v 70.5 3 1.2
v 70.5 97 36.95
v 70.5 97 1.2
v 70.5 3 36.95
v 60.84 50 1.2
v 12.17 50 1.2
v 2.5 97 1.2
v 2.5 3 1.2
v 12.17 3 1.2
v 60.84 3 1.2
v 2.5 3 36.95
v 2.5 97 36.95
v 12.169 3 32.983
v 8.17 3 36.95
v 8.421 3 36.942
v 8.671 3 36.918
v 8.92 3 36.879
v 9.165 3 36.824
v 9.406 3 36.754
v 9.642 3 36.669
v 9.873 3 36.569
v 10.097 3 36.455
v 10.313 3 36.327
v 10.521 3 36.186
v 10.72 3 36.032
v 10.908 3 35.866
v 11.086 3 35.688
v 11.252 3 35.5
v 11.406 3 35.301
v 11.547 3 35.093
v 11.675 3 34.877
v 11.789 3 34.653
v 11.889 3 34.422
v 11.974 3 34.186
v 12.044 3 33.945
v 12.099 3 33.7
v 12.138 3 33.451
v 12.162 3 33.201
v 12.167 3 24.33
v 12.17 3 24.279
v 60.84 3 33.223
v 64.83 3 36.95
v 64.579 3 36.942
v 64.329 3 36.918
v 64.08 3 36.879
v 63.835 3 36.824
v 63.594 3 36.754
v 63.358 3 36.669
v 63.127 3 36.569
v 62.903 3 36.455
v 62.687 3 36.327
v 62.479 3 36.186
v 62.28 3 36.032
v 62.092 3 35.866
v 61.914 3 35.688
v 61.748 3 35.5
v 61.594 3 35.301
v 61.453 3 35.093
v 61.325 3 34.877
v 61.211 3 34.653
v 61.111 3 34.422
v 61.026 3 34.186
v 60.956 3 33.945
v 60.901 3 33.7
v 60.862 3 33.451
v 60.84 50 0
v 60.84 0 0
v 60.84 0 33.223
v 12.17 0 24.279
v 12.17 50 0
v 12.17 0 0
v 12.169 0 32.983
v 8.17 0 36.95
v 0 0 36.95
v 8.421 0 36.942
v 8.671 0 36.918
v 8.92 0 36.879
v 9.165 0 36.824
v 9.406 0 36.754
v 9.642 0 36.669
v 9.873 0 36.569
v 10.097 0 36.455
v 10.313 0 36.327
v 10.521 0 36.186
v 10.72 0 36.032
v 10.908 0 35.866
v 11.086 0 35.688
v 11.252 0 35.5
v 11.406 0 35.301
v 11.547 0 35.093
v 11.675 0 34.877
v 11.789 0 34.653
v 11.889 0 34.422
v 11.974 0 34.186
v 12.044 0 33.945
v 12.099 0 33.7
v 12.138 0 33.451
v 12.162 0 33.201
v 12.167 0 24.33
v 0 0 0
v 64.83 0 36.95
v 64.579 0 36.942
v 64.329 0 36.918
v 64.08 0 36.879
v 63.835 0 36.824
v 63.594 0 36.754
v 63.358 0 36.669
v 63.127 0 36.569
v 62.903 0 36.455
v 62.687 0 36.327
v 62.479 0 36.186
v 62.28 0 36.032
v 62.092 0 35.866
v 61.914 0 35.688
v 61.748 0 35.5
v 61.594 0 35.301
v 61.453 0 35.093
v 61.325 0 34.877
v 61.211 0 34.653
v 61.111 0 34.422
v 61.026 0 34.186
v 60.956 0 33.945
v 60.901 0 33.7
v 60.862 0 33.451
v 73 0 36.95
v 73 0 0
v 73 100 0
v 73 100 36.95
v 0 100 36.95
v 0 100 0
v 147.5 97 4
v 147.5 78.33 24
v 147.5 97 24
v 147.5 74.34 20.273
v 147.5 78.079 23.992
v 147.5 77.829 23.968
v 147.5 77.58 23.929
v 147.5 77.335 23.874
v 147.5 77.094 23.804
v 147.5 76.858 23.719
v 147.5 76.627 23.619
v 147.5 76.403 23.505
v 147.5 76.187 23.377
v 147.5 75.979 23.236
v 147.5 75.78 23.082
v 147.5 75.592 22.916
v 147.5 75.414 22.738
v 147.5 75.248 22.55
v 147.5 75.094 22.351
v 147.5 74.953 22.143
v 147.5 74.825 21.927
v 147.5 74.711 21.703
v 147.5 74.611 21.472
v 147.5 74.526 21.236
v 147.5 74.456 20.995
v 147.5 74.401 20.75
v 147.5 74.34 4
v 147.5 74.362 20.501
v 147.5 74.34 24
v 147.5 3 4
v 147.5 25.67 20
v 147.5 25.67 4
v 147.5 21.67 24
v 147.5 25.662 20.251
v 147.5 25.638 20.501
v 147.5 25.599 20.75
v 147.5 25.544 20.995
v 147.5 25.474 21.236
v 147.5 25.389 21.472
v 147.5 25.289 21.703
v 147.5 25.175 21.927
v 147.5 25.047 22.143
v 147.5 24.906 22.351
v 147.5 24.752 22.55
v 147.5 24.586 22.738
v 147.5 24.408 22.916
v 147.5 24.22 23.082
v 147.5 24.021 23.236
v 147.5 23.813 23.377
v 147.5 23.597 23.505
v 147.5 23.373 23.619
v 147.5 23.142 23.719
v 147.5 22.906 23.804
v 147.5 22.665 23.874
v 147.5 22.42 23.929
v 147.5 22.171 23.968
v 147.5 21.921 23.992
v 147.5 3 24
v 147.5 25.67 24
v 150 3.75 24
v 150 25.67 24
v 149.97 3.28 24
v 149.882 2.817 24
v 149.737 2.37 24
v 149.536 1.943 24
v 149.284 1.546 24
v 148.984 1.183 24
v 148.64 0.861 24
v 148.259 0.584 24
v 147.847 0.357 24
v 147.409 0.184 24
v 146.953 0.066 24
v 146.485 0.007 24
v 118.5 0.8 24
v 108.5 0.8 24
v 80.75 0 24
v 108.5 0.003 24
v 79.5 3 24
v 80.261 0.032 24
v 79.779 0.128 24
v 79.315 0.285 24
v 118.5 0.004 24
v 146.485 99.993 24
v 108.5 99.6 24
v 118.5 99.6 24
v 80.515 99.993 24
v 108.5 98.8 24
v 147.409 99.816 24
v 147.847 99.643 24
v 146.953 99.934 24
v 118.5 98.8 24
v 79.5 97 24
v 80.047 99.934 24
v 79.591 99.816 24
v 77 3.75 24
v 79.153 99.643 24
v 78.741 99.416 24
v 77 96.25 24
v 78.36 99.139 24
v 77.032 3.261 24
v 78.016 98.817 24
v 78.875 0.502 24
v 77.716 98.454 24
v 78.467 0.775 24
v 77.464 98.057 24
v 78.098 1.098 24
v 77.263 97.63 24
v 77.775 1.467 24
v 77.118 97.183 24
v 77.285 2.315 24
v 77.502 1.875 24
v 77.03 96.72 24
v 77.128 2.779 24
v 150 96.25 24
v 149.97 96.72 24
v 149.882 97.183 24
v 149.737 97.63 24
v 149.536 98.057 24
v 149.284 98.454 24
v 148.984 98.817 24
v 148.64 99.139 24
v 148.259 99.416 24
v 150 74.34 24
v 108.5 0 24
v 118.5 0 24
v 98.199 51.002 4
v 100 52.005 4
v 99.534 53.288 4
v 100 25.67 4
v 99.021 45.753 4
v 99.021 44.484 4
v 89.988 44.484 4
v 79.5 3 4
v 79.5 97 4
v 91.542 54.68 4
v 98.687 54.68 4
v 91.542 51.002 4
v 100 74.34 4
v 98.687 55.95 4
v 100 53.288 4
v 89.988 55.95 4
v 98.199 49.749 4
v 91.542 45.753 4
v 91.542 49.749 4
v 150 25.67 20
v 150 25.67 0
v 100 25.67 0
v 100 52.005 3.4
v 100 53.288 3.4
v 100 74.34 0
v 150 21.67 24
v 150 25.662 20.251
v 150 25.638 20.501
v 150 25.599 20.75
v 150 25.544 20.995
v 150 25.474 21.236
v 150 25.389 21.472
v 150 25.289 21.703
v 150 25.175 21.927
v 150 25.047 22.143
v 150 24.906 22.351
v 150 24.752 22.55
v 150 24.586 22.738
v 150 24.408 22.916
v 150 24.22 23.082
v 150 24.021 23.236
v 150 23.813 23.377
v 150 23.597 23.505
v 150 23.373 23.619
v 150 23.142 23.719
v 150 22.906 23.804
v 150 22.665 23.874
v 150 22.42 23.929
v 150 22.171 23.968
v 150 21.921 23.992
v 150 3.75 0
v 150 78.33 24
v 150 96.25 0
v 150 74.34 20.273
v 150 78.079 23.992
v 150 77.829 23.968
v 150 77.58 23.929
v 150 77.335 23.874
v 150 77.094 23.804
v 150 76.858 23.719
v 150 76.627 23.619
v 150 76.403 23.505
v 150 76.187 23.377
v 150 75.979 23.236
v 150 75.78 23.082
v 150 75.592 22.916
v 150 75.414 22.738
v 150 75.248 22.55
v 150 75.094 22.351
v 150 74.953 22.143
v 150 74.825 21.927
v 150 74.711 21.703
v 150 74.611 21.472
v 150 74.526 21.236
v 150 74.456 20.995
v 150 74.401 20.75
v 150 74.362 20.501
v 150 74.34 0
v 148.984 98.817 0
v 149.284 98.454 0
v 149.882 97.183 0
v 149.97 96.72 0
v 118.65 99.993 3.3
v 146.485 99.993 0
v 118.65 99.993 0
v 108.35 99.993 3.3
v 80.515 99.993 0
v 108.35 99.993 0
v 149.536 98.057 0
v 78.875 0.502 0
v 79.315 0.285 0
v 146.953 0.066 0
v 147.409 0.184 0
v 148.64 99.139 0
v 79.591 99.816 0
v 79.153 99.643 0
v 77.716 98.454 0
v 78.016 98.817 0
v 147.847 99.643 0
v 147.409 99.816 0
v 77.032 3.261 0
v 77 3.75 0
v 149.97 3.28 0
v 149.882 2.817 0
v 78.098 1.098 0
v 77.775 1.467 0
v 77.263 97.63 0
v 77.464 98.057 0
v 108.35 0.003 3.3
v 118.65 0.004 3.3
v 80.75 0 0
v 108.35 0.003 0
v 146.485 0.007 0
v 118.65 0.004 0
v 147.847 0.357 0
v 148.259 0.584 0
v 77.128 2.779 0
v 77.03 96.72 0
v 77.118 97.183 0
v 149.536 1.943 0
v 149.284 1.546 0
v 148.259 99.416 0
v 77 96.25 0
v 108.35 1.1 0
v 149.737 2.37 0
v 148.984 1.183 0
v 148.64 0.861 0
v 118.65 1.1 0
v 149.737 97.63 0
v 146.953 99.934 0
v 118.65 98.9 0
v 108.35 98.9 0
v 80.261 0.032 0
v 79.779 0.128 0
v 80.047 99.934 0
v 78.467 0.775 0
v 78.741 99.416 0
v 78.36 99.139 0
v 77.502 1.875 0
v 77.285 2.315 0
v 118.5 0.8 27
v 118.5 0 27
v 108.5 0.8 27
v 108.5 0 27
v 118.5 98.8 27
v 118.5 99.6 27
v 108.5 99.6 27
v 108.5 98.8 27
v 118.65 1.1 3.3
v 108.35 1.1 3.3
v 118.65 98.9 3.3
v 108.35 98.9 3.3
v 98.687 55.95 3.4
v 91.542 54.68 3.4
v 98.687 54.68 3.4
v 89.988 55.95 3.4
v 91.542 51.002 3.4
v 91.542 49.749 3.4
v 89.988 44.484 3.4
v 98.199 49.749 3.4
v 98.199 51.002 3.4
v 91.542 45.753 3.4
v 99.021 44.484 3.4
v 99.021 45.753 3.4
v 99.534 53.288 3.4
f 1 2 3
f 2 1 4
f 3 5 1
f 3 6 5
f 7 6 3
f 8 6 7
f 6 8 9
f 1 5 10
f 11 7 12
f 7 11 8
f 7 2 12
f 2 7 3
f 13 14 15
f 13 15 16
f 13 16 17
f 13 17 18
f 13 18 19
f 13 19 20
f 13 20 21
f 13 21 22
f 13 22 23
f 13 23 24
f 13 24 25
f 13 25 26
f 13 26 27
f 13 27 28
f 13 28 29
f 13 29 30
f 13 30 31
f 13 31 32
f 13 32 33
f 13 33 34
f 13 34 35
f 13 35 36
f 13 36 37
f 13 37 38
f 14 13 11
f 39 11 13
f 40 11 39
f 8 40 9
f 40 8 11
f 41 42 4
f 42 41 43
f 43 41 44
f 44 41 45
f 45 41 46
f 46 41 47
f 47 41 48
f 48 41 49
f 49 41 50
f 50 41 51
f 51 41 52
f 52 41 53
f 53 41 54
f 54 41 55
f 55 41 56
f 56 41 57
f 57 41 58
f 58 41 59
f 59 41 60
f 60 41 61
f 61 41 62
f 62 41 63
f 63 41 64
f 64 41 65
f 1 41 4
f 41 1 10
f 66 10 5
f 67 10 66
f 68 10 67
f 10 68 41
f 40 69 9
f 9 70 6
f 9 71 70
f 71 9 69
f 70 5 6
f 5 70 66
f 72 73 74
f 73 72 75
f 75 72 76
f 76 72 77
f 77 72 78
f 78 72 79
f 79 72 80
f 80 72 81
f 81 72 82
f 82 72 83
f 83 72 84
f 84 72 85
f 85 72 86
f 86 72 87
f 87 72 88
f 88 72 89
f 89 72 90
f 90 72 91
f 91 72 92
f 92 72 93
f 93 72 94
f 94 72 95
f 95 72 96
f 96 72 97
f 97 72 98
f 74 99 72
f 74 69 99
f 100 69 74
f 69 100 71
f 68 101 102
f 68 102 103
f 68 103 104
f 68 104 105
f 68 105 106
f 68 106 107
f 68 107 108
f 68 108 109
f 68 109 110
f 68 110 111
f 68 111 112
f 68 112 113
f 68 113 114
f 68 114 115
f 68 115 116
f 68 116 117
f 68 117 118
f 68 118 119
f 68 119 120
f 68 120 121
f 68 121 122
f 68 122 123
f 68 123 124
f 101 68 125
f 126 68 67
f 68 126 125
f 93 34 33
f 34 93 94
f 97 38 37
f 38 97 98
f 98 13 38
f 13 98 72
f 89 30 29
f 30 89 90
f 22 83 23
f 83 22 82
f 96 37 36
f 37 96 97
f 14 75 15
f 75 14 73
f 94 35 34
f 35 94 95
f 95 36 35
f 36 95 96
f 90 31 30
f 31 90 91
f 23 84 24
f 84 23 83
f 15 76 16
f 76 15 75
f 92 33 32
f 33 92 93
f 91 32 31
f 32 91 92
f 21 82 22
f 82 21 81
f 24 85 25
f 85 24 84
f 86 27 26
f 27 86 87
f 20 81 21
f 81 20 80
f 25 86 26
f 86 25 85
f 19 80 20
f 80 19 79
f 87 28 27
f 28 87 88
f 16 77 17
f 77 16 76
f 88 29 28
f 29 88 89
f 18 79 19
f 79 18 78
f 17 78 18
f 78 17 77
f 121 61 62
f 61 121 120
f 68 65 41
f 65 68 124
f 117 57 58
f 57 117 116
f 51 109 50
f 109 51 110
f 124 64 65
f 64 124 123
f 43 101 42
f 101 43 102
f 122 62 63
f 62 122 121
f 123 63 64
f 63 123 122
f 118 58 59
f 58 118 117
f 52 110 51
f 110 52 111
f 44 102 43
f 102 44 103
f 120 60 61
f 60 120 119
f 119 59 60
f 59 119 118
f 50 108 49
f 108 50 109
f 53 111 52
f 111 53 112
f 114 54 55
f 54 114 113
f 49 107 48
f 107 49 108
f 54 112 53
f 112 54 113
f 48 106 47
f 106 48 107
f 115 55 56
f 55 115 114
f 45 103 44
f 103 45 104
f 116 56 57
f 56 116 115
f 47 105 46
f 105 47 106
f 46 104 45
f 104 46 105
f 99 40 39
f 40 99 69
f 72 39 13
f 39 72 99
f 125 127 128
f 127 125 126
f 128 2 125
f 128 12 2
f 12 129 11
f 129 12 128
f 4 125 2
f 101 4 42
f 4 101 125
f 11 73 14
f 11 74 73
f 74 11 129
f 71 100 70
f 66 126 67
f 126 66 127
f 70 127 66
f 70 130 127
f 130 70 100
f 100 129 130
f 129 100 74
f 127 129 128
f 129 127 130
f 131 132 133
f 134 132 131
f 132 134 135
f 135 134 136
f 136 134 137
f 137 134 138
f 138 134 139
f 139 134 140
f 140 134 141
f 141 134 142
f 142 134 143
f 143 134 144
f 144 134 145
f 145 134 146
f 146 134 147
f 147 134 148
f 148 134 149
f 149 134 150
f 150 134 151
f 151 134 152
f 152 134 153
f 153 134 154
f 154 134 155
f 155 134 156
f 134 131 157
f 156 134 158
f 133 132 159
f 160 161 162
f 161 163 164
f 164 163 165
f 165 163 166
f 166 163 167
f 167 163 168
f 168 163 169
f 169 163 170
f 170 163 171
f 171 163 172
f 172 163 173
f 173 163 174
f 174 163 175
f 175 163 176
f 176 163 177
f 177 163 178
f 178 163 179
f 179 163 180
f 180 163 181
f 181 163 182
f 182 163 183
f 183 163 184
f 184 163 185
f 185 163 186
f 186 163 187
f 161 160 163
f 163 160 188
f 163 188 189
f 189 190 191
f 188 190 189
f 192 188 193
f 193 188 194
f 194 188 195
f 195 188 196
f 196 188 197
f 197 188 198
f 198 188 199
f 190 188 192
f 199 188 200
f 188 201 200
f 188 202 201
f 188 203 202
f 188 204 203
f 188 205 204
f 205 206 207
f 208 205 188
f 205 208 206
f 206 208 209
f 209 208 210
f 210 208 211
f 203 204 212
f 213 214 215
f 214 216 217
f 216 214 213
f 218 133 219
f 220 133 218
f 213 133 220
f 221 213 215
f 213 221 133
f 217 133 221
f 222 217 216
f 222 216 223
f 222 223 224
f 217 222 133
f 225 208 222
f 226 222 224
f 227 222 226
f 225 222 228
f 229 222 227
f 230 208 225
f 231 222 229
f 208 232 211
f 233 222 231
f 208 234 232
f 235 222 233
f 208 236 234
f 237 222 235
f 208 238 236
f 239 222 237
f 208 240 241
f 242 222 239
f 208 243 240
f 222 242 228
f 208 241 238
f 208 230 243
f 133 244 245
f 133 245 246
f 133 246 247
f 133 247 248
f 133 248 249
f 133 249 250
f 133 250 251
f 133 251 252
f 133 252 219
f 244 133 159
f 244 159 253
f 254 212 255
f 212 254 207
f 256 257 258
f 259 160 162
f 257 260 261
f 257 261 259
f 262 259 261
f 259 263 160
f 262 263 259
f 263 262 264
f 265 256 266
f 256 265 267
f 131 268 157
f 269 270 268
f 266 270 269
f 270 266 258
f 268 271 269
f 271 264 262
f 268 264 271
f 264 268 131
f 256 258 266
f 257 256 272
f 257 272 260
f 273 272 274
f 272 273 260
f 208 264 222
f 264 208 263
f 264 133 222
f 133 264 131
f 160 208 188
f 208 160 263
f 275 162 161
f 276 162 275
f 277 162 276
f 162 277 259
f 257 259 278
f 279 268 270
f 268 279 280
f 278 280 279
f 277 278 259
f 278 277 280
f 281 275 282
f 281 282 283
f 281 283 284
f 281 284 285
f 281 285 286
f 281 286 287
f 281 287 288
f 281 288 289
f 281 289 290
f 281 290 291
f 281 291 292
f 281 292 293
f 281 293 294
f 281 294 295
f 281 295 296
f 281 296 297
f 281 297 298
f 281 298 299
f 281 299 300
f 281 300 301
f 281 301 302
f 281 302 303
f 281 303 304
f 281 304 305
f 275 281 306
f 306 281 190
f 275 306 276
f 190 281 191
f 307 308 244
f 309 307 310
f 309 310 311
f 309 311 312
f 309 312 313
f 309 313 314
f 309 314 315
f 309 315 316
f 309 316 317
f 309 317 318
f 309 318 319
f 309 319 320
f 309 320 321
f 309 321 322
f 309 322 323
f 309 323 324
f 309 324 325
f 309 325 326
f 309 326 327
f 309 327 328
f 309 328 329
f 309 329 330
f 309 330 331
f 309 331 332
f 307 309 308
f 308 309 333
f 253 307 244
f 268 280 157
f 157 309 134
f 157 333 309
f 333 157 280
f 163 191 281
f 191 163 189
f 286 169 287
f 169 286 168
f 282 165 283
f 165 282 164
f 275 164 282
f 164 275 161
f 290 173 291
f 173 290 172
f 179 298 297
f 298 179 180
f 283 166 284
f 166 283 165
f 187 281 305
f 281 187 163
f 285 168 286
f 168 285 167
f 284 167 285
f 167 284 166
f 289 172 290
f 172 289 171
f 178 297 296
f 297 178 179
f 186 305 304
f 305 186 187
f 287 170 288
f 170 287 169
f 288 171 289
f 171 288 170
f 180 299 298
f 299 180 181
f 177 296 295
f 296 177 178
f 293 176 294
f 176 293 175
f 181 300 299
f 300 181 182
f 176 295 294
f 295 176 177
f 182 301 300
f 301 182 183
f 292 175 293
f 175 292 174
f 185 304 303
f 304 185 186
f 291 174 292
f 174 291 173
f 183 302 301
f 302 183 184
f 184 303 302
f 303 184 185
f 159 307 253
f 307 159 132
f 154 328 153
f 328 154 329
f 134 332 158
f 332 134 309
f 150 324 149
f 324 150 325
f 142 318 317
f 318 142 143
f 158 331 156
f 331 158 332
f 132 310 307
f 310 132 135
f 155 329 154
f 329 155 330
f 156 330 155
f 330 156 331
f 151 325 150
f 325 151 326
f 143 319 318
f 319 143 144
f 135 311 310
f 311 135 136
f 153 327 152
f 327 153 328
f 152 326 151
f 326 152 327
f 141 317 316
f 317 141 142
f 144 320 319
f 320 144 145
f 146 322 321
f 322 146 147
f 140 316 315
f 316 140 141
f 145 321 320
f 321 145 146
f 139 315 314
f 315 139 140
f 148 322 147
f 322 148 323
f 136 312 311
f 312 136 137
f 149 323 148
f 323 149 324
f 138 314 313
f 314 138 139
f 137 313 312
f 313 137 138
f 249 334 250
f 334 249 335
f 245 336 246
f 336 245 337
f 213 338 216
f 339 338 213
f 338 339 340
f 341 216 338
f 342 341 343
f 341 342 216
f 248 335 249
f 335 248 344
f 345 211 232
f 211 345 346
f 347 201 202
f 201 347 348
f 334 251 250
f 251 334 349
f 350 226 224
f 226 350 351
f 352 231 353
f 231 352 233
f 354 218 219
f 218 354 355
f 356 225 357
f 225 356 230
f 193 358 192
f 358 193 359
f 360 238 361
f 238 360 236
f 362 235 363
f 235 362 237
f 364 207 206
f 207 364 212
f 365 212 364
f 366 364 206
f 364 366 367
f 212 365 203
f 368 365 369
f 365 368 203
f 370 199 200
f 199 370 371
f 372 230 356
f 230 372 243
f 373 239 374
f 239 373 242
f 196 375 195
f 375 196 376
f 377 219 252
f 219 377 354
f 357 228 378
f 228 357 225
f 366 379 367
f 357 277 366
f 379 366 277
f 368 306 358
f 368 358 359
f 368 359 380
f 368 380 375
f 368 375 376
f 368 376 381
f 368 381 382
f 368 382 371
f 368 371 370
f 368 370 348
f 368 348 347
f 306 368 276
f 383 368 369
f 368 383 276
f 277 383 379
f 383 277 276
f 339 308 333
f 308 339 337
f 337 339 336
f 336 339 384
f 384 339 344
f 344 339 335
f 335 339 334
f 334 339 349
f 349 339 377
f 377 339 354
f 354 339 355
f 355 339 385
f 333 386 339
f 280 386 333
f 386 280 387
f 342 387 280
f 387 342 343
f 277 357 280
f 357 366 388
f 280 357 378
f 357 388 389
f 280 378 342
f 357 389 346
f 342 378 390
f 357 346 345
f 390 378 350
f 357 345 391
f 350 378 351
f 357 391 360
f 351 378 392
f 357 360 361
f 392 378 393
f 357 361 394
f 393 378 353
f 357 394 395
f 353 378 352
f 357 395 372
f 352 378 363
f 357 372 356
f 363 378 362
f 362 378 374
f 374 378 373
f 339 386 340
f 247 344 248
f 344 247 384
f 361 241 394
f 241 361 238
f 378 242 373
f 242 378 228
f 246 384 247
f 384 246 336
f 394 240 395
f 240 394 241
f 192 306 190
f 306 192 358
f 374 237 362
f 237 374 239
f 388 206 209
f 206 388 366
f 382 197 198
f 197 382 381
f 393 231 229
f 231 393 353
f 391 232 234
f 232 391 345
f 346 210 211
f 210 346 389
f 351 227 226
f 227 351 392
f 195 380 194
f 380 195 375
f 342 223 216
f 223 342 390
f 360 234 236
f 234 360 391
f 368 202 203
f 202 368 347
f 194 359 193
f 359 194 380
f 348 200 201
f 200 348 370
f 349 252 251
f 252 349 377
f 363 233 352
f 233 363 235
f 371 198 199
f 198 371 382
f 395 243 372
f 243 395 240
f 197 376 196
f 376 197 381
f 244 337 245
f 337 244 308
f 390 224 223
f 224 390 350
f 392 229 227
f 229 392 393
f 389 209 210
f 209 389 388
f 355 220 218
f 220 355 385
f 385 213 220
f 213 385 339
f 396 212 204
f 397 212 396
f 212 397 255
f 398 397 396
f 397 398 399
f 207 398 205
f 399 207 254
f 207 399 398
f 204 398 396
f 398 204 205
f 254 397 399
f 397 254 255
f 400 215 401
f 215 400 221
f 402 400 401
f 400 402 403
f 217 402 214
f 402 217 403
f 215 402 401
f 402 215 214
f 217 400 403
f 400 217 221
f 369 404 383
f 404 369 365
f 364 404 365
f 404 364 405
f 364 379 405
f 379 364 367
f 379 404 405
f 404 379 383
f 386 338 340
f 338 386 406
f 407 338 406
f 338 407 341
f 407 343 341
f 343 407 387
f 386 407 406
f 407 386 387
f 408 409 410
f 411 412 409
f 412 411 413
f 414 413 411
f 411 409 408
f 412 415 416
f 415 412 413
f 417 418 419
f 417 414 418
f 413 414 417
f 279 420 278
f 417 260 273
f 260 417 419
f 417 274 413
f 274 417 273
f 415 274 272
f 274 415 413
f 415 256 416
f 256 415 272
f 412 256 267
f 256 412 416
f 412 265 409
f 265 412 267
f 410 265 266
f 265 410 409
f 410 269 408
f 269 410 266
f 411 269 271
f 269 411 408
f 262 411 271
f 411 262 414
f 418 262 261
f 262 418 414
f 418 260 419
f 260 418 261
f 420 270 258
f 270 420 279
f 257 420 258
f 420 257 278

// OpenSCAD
$fn=48;
translate([0,0,0])
{
difference()
{
    cube(size = [73.00, 100.00, 36.95], center = false); 
    translate(v = [2.50, 3.00, 1.20])
    {
        union()
        {
            union()
            {
                cube(size = [68.00, 94.00, 35.75], center = false); 
                translate(v = [9.67, -3.00, -1.30])
                {
                    cube(size = [48.67, 50.00, 37.05], center = false); 
                }
            }
            translate(v = [5.67, -1.00, -1.20])
            {
                translate(v = [28.33, 0.00, 24.33])
                {
                    union()
                    {
                        hull()
                        {
                            rotate([90.00, 0.00, 0.00])
                            {
                                difference()
                                {
                                    cylinder(center = true, r1 = 24.333333333333332, r2 = 24.333333333333332, h = 4);
                                    translate(v = [-48.67, 0.00, -2.00])
                                    {
                                        cube(size = [97.33, 48.67, 4.00], center = false); 
                                    }
                                }
                            }
                            translate(v = [-24.33, -2.00, 0.00])
                            {
                                cube(size = [48.67, 4.00, 12.62], center = false); 
                            }
                        }
                        translate(v = [-28.33, -2.00, 8.62])
                        {
                            difference()
                            {
                                cube(size = [4.00, 4.00, 4.00], center = false); 
                                translate(v = [0.00, 4.00, 0.00])
                                {
                                    rotate([90.00, 0.00, 0.00])
                                    {
                                        cylinder(center = false, r1 = 4, r2 = 4, h = 4, $fn = 100);
                                    }
                                }
                            }
                        }
                        mirror([48.67, 0.00, 0.00])
                        {
                            translate(v = [-28.33, -2.00, 8.62])
                            {
                                difference()
                                {
                                    cube(size = [4.00, 4.00, 4.00], center = false); 
                                    translate(v = [0.00, 4.00, 0.00])
                                    {
                                        rotate([90.00, 0.00, 0.00])
                                        {
                                            cylinder(center = false, r1 = 4, r2 = 4, h = 4, $fn = 100);
                                        }
                                    }
                                }
                            }
                        }
                    }
                }
            }
        }
    }
}

}
translate([77,0,0])
{
difference()
{
    difference()
    {
        union()
        {
            difference()
            {
                translate(v = [3.75, 3.75, 0.00])
                {
                    hull()
                    {
                        cylinder(center = false, r1 = 3.75, r2 = 3.75, h = 24);
                        translate(v = [65.50, 0.00, 0.00])
                        {
                            cylinder(center = false, r1 = 3.75, r2 = 3.75, h = 24, $fn = 50);
                        }
                        translate(v = [0.00, 92.50, 0.00])
                        {
                            cylinder(center = false, r1 = 3.75, r2 = 3.75, h = 24, $fn = 50);
                        }
                        translate(v = [65.50, 92.50, 0.00])
                        {
                            cylinder(center = false, r1 = 3.75, r2 = 3.75, h = 24, $fn = 50);
                        }
                    }
                }
                translate(v = [2.50, 3.00, 4.00])
                {
                    union()
                    {
                        union()
                        {
                            cube(size = [68.00, 94.00, 20.00], center = false); 
                            translate(v = [70.50, 22.67, -4.10])
                            {
                                rotate([0.00, 0.00, 90.00])
                                {
                                    cube(size = [48.67, 50.00, 24.10], center = false); 
                                }
                            }
                        }
                        translate(v = [68.50, 18.67, -4.00])
                        {
                            rotate([0.00, 0.00, 90.00])
                            {
                                translate(v = [28.33, 0.00, 24.33])
                                {
                                    union()
                                    {
                                        hull()
                                        {
                                            rotate([90.00, 0.00, 0.00])
                                            {
                                                difference()
                                                {
                                                    cylinder(center = true, r1 = 24.333333333333332, r2 = 24.333333333333332, h = 4);
                                                    translate(v = [-48.67, 0.00, -2.00])
                                                    {
                                                        cube(size = [97.33, 48.67, 4.00], center = false); 
                                                    }
                                                }
                                            }
                                            translate(v = [-24.33, -2.00, 0.00])
                                            {
                                                cube(size = [48.67, 4.00, -0.33], center = false); 
                                            }
                                        }
                                        translate(v = [-28.33, -2.00, -4.33])
                                        {
                                            difference()
                                            {
                                                cube(size = [4.00, 4.00, 4.00], center = false); 
                                                translate(v = [0.00, 4.00, 0.00])
                                                {
                                                    rotate([90.00, 0.00, 0.00])
                                                    {
                                                        cylinder(center = false, r1 = 4, r2 = 4, h = 4, $fn = 100);
                                                    }
                                                }
                                            }
                                        }
                                        mirror([48.67, 0.00, 0.00])
                                        {
                                            translate(v = [-28.33, -2.00, -4.33])
                                            {
                                                difference()
                                                {
                                                    cube(size = [4.00, 4.00, 4.00], center = false); 
                                                    translate(v = [0.00, 4.00, 0.00])
                                                    {
                                                        rotate([90.00, 0.00, 0.00])
                                                        {
                                                            cylinder(center = false, r1 = 4, r2 = 4, h = 4, $fn = 100);
                                                        }
                                                    }
                                                }
                                            }
                                        }
                                    }
                                }
                            }
                        }
                    }
                }
            }
            translate(v = [31.50, 0.00, 24.00])
            {
                cube(size = [10.00, 0.80, 3.00], center = false); 
            }
            translate(v = [31.50, 98.80, 24.00])
            {
                cube(size = [10.00, 0.80, 3.00], center = false); 
            }
        }
        translate(v = [31.35, 0.00, 0.00])
        {
            cube(size = [10.30, 1.10, 3.30], center = false); 
        }
        translate(v = [31.35, 98.90, 0.00])
        {
            cube(size = [10.30, 1.10, 3.30], center = false); 
        }
    }
    translate(v = [36.50, 50.00, 3.40])
    {
        scale(v = [1.00, 1.00, 0.65])
        {
            linear_extrude(height = 1)
            {
                text("Events", size = 12, halign = "center", valign = "center");
            }
        }
    }
}

}
